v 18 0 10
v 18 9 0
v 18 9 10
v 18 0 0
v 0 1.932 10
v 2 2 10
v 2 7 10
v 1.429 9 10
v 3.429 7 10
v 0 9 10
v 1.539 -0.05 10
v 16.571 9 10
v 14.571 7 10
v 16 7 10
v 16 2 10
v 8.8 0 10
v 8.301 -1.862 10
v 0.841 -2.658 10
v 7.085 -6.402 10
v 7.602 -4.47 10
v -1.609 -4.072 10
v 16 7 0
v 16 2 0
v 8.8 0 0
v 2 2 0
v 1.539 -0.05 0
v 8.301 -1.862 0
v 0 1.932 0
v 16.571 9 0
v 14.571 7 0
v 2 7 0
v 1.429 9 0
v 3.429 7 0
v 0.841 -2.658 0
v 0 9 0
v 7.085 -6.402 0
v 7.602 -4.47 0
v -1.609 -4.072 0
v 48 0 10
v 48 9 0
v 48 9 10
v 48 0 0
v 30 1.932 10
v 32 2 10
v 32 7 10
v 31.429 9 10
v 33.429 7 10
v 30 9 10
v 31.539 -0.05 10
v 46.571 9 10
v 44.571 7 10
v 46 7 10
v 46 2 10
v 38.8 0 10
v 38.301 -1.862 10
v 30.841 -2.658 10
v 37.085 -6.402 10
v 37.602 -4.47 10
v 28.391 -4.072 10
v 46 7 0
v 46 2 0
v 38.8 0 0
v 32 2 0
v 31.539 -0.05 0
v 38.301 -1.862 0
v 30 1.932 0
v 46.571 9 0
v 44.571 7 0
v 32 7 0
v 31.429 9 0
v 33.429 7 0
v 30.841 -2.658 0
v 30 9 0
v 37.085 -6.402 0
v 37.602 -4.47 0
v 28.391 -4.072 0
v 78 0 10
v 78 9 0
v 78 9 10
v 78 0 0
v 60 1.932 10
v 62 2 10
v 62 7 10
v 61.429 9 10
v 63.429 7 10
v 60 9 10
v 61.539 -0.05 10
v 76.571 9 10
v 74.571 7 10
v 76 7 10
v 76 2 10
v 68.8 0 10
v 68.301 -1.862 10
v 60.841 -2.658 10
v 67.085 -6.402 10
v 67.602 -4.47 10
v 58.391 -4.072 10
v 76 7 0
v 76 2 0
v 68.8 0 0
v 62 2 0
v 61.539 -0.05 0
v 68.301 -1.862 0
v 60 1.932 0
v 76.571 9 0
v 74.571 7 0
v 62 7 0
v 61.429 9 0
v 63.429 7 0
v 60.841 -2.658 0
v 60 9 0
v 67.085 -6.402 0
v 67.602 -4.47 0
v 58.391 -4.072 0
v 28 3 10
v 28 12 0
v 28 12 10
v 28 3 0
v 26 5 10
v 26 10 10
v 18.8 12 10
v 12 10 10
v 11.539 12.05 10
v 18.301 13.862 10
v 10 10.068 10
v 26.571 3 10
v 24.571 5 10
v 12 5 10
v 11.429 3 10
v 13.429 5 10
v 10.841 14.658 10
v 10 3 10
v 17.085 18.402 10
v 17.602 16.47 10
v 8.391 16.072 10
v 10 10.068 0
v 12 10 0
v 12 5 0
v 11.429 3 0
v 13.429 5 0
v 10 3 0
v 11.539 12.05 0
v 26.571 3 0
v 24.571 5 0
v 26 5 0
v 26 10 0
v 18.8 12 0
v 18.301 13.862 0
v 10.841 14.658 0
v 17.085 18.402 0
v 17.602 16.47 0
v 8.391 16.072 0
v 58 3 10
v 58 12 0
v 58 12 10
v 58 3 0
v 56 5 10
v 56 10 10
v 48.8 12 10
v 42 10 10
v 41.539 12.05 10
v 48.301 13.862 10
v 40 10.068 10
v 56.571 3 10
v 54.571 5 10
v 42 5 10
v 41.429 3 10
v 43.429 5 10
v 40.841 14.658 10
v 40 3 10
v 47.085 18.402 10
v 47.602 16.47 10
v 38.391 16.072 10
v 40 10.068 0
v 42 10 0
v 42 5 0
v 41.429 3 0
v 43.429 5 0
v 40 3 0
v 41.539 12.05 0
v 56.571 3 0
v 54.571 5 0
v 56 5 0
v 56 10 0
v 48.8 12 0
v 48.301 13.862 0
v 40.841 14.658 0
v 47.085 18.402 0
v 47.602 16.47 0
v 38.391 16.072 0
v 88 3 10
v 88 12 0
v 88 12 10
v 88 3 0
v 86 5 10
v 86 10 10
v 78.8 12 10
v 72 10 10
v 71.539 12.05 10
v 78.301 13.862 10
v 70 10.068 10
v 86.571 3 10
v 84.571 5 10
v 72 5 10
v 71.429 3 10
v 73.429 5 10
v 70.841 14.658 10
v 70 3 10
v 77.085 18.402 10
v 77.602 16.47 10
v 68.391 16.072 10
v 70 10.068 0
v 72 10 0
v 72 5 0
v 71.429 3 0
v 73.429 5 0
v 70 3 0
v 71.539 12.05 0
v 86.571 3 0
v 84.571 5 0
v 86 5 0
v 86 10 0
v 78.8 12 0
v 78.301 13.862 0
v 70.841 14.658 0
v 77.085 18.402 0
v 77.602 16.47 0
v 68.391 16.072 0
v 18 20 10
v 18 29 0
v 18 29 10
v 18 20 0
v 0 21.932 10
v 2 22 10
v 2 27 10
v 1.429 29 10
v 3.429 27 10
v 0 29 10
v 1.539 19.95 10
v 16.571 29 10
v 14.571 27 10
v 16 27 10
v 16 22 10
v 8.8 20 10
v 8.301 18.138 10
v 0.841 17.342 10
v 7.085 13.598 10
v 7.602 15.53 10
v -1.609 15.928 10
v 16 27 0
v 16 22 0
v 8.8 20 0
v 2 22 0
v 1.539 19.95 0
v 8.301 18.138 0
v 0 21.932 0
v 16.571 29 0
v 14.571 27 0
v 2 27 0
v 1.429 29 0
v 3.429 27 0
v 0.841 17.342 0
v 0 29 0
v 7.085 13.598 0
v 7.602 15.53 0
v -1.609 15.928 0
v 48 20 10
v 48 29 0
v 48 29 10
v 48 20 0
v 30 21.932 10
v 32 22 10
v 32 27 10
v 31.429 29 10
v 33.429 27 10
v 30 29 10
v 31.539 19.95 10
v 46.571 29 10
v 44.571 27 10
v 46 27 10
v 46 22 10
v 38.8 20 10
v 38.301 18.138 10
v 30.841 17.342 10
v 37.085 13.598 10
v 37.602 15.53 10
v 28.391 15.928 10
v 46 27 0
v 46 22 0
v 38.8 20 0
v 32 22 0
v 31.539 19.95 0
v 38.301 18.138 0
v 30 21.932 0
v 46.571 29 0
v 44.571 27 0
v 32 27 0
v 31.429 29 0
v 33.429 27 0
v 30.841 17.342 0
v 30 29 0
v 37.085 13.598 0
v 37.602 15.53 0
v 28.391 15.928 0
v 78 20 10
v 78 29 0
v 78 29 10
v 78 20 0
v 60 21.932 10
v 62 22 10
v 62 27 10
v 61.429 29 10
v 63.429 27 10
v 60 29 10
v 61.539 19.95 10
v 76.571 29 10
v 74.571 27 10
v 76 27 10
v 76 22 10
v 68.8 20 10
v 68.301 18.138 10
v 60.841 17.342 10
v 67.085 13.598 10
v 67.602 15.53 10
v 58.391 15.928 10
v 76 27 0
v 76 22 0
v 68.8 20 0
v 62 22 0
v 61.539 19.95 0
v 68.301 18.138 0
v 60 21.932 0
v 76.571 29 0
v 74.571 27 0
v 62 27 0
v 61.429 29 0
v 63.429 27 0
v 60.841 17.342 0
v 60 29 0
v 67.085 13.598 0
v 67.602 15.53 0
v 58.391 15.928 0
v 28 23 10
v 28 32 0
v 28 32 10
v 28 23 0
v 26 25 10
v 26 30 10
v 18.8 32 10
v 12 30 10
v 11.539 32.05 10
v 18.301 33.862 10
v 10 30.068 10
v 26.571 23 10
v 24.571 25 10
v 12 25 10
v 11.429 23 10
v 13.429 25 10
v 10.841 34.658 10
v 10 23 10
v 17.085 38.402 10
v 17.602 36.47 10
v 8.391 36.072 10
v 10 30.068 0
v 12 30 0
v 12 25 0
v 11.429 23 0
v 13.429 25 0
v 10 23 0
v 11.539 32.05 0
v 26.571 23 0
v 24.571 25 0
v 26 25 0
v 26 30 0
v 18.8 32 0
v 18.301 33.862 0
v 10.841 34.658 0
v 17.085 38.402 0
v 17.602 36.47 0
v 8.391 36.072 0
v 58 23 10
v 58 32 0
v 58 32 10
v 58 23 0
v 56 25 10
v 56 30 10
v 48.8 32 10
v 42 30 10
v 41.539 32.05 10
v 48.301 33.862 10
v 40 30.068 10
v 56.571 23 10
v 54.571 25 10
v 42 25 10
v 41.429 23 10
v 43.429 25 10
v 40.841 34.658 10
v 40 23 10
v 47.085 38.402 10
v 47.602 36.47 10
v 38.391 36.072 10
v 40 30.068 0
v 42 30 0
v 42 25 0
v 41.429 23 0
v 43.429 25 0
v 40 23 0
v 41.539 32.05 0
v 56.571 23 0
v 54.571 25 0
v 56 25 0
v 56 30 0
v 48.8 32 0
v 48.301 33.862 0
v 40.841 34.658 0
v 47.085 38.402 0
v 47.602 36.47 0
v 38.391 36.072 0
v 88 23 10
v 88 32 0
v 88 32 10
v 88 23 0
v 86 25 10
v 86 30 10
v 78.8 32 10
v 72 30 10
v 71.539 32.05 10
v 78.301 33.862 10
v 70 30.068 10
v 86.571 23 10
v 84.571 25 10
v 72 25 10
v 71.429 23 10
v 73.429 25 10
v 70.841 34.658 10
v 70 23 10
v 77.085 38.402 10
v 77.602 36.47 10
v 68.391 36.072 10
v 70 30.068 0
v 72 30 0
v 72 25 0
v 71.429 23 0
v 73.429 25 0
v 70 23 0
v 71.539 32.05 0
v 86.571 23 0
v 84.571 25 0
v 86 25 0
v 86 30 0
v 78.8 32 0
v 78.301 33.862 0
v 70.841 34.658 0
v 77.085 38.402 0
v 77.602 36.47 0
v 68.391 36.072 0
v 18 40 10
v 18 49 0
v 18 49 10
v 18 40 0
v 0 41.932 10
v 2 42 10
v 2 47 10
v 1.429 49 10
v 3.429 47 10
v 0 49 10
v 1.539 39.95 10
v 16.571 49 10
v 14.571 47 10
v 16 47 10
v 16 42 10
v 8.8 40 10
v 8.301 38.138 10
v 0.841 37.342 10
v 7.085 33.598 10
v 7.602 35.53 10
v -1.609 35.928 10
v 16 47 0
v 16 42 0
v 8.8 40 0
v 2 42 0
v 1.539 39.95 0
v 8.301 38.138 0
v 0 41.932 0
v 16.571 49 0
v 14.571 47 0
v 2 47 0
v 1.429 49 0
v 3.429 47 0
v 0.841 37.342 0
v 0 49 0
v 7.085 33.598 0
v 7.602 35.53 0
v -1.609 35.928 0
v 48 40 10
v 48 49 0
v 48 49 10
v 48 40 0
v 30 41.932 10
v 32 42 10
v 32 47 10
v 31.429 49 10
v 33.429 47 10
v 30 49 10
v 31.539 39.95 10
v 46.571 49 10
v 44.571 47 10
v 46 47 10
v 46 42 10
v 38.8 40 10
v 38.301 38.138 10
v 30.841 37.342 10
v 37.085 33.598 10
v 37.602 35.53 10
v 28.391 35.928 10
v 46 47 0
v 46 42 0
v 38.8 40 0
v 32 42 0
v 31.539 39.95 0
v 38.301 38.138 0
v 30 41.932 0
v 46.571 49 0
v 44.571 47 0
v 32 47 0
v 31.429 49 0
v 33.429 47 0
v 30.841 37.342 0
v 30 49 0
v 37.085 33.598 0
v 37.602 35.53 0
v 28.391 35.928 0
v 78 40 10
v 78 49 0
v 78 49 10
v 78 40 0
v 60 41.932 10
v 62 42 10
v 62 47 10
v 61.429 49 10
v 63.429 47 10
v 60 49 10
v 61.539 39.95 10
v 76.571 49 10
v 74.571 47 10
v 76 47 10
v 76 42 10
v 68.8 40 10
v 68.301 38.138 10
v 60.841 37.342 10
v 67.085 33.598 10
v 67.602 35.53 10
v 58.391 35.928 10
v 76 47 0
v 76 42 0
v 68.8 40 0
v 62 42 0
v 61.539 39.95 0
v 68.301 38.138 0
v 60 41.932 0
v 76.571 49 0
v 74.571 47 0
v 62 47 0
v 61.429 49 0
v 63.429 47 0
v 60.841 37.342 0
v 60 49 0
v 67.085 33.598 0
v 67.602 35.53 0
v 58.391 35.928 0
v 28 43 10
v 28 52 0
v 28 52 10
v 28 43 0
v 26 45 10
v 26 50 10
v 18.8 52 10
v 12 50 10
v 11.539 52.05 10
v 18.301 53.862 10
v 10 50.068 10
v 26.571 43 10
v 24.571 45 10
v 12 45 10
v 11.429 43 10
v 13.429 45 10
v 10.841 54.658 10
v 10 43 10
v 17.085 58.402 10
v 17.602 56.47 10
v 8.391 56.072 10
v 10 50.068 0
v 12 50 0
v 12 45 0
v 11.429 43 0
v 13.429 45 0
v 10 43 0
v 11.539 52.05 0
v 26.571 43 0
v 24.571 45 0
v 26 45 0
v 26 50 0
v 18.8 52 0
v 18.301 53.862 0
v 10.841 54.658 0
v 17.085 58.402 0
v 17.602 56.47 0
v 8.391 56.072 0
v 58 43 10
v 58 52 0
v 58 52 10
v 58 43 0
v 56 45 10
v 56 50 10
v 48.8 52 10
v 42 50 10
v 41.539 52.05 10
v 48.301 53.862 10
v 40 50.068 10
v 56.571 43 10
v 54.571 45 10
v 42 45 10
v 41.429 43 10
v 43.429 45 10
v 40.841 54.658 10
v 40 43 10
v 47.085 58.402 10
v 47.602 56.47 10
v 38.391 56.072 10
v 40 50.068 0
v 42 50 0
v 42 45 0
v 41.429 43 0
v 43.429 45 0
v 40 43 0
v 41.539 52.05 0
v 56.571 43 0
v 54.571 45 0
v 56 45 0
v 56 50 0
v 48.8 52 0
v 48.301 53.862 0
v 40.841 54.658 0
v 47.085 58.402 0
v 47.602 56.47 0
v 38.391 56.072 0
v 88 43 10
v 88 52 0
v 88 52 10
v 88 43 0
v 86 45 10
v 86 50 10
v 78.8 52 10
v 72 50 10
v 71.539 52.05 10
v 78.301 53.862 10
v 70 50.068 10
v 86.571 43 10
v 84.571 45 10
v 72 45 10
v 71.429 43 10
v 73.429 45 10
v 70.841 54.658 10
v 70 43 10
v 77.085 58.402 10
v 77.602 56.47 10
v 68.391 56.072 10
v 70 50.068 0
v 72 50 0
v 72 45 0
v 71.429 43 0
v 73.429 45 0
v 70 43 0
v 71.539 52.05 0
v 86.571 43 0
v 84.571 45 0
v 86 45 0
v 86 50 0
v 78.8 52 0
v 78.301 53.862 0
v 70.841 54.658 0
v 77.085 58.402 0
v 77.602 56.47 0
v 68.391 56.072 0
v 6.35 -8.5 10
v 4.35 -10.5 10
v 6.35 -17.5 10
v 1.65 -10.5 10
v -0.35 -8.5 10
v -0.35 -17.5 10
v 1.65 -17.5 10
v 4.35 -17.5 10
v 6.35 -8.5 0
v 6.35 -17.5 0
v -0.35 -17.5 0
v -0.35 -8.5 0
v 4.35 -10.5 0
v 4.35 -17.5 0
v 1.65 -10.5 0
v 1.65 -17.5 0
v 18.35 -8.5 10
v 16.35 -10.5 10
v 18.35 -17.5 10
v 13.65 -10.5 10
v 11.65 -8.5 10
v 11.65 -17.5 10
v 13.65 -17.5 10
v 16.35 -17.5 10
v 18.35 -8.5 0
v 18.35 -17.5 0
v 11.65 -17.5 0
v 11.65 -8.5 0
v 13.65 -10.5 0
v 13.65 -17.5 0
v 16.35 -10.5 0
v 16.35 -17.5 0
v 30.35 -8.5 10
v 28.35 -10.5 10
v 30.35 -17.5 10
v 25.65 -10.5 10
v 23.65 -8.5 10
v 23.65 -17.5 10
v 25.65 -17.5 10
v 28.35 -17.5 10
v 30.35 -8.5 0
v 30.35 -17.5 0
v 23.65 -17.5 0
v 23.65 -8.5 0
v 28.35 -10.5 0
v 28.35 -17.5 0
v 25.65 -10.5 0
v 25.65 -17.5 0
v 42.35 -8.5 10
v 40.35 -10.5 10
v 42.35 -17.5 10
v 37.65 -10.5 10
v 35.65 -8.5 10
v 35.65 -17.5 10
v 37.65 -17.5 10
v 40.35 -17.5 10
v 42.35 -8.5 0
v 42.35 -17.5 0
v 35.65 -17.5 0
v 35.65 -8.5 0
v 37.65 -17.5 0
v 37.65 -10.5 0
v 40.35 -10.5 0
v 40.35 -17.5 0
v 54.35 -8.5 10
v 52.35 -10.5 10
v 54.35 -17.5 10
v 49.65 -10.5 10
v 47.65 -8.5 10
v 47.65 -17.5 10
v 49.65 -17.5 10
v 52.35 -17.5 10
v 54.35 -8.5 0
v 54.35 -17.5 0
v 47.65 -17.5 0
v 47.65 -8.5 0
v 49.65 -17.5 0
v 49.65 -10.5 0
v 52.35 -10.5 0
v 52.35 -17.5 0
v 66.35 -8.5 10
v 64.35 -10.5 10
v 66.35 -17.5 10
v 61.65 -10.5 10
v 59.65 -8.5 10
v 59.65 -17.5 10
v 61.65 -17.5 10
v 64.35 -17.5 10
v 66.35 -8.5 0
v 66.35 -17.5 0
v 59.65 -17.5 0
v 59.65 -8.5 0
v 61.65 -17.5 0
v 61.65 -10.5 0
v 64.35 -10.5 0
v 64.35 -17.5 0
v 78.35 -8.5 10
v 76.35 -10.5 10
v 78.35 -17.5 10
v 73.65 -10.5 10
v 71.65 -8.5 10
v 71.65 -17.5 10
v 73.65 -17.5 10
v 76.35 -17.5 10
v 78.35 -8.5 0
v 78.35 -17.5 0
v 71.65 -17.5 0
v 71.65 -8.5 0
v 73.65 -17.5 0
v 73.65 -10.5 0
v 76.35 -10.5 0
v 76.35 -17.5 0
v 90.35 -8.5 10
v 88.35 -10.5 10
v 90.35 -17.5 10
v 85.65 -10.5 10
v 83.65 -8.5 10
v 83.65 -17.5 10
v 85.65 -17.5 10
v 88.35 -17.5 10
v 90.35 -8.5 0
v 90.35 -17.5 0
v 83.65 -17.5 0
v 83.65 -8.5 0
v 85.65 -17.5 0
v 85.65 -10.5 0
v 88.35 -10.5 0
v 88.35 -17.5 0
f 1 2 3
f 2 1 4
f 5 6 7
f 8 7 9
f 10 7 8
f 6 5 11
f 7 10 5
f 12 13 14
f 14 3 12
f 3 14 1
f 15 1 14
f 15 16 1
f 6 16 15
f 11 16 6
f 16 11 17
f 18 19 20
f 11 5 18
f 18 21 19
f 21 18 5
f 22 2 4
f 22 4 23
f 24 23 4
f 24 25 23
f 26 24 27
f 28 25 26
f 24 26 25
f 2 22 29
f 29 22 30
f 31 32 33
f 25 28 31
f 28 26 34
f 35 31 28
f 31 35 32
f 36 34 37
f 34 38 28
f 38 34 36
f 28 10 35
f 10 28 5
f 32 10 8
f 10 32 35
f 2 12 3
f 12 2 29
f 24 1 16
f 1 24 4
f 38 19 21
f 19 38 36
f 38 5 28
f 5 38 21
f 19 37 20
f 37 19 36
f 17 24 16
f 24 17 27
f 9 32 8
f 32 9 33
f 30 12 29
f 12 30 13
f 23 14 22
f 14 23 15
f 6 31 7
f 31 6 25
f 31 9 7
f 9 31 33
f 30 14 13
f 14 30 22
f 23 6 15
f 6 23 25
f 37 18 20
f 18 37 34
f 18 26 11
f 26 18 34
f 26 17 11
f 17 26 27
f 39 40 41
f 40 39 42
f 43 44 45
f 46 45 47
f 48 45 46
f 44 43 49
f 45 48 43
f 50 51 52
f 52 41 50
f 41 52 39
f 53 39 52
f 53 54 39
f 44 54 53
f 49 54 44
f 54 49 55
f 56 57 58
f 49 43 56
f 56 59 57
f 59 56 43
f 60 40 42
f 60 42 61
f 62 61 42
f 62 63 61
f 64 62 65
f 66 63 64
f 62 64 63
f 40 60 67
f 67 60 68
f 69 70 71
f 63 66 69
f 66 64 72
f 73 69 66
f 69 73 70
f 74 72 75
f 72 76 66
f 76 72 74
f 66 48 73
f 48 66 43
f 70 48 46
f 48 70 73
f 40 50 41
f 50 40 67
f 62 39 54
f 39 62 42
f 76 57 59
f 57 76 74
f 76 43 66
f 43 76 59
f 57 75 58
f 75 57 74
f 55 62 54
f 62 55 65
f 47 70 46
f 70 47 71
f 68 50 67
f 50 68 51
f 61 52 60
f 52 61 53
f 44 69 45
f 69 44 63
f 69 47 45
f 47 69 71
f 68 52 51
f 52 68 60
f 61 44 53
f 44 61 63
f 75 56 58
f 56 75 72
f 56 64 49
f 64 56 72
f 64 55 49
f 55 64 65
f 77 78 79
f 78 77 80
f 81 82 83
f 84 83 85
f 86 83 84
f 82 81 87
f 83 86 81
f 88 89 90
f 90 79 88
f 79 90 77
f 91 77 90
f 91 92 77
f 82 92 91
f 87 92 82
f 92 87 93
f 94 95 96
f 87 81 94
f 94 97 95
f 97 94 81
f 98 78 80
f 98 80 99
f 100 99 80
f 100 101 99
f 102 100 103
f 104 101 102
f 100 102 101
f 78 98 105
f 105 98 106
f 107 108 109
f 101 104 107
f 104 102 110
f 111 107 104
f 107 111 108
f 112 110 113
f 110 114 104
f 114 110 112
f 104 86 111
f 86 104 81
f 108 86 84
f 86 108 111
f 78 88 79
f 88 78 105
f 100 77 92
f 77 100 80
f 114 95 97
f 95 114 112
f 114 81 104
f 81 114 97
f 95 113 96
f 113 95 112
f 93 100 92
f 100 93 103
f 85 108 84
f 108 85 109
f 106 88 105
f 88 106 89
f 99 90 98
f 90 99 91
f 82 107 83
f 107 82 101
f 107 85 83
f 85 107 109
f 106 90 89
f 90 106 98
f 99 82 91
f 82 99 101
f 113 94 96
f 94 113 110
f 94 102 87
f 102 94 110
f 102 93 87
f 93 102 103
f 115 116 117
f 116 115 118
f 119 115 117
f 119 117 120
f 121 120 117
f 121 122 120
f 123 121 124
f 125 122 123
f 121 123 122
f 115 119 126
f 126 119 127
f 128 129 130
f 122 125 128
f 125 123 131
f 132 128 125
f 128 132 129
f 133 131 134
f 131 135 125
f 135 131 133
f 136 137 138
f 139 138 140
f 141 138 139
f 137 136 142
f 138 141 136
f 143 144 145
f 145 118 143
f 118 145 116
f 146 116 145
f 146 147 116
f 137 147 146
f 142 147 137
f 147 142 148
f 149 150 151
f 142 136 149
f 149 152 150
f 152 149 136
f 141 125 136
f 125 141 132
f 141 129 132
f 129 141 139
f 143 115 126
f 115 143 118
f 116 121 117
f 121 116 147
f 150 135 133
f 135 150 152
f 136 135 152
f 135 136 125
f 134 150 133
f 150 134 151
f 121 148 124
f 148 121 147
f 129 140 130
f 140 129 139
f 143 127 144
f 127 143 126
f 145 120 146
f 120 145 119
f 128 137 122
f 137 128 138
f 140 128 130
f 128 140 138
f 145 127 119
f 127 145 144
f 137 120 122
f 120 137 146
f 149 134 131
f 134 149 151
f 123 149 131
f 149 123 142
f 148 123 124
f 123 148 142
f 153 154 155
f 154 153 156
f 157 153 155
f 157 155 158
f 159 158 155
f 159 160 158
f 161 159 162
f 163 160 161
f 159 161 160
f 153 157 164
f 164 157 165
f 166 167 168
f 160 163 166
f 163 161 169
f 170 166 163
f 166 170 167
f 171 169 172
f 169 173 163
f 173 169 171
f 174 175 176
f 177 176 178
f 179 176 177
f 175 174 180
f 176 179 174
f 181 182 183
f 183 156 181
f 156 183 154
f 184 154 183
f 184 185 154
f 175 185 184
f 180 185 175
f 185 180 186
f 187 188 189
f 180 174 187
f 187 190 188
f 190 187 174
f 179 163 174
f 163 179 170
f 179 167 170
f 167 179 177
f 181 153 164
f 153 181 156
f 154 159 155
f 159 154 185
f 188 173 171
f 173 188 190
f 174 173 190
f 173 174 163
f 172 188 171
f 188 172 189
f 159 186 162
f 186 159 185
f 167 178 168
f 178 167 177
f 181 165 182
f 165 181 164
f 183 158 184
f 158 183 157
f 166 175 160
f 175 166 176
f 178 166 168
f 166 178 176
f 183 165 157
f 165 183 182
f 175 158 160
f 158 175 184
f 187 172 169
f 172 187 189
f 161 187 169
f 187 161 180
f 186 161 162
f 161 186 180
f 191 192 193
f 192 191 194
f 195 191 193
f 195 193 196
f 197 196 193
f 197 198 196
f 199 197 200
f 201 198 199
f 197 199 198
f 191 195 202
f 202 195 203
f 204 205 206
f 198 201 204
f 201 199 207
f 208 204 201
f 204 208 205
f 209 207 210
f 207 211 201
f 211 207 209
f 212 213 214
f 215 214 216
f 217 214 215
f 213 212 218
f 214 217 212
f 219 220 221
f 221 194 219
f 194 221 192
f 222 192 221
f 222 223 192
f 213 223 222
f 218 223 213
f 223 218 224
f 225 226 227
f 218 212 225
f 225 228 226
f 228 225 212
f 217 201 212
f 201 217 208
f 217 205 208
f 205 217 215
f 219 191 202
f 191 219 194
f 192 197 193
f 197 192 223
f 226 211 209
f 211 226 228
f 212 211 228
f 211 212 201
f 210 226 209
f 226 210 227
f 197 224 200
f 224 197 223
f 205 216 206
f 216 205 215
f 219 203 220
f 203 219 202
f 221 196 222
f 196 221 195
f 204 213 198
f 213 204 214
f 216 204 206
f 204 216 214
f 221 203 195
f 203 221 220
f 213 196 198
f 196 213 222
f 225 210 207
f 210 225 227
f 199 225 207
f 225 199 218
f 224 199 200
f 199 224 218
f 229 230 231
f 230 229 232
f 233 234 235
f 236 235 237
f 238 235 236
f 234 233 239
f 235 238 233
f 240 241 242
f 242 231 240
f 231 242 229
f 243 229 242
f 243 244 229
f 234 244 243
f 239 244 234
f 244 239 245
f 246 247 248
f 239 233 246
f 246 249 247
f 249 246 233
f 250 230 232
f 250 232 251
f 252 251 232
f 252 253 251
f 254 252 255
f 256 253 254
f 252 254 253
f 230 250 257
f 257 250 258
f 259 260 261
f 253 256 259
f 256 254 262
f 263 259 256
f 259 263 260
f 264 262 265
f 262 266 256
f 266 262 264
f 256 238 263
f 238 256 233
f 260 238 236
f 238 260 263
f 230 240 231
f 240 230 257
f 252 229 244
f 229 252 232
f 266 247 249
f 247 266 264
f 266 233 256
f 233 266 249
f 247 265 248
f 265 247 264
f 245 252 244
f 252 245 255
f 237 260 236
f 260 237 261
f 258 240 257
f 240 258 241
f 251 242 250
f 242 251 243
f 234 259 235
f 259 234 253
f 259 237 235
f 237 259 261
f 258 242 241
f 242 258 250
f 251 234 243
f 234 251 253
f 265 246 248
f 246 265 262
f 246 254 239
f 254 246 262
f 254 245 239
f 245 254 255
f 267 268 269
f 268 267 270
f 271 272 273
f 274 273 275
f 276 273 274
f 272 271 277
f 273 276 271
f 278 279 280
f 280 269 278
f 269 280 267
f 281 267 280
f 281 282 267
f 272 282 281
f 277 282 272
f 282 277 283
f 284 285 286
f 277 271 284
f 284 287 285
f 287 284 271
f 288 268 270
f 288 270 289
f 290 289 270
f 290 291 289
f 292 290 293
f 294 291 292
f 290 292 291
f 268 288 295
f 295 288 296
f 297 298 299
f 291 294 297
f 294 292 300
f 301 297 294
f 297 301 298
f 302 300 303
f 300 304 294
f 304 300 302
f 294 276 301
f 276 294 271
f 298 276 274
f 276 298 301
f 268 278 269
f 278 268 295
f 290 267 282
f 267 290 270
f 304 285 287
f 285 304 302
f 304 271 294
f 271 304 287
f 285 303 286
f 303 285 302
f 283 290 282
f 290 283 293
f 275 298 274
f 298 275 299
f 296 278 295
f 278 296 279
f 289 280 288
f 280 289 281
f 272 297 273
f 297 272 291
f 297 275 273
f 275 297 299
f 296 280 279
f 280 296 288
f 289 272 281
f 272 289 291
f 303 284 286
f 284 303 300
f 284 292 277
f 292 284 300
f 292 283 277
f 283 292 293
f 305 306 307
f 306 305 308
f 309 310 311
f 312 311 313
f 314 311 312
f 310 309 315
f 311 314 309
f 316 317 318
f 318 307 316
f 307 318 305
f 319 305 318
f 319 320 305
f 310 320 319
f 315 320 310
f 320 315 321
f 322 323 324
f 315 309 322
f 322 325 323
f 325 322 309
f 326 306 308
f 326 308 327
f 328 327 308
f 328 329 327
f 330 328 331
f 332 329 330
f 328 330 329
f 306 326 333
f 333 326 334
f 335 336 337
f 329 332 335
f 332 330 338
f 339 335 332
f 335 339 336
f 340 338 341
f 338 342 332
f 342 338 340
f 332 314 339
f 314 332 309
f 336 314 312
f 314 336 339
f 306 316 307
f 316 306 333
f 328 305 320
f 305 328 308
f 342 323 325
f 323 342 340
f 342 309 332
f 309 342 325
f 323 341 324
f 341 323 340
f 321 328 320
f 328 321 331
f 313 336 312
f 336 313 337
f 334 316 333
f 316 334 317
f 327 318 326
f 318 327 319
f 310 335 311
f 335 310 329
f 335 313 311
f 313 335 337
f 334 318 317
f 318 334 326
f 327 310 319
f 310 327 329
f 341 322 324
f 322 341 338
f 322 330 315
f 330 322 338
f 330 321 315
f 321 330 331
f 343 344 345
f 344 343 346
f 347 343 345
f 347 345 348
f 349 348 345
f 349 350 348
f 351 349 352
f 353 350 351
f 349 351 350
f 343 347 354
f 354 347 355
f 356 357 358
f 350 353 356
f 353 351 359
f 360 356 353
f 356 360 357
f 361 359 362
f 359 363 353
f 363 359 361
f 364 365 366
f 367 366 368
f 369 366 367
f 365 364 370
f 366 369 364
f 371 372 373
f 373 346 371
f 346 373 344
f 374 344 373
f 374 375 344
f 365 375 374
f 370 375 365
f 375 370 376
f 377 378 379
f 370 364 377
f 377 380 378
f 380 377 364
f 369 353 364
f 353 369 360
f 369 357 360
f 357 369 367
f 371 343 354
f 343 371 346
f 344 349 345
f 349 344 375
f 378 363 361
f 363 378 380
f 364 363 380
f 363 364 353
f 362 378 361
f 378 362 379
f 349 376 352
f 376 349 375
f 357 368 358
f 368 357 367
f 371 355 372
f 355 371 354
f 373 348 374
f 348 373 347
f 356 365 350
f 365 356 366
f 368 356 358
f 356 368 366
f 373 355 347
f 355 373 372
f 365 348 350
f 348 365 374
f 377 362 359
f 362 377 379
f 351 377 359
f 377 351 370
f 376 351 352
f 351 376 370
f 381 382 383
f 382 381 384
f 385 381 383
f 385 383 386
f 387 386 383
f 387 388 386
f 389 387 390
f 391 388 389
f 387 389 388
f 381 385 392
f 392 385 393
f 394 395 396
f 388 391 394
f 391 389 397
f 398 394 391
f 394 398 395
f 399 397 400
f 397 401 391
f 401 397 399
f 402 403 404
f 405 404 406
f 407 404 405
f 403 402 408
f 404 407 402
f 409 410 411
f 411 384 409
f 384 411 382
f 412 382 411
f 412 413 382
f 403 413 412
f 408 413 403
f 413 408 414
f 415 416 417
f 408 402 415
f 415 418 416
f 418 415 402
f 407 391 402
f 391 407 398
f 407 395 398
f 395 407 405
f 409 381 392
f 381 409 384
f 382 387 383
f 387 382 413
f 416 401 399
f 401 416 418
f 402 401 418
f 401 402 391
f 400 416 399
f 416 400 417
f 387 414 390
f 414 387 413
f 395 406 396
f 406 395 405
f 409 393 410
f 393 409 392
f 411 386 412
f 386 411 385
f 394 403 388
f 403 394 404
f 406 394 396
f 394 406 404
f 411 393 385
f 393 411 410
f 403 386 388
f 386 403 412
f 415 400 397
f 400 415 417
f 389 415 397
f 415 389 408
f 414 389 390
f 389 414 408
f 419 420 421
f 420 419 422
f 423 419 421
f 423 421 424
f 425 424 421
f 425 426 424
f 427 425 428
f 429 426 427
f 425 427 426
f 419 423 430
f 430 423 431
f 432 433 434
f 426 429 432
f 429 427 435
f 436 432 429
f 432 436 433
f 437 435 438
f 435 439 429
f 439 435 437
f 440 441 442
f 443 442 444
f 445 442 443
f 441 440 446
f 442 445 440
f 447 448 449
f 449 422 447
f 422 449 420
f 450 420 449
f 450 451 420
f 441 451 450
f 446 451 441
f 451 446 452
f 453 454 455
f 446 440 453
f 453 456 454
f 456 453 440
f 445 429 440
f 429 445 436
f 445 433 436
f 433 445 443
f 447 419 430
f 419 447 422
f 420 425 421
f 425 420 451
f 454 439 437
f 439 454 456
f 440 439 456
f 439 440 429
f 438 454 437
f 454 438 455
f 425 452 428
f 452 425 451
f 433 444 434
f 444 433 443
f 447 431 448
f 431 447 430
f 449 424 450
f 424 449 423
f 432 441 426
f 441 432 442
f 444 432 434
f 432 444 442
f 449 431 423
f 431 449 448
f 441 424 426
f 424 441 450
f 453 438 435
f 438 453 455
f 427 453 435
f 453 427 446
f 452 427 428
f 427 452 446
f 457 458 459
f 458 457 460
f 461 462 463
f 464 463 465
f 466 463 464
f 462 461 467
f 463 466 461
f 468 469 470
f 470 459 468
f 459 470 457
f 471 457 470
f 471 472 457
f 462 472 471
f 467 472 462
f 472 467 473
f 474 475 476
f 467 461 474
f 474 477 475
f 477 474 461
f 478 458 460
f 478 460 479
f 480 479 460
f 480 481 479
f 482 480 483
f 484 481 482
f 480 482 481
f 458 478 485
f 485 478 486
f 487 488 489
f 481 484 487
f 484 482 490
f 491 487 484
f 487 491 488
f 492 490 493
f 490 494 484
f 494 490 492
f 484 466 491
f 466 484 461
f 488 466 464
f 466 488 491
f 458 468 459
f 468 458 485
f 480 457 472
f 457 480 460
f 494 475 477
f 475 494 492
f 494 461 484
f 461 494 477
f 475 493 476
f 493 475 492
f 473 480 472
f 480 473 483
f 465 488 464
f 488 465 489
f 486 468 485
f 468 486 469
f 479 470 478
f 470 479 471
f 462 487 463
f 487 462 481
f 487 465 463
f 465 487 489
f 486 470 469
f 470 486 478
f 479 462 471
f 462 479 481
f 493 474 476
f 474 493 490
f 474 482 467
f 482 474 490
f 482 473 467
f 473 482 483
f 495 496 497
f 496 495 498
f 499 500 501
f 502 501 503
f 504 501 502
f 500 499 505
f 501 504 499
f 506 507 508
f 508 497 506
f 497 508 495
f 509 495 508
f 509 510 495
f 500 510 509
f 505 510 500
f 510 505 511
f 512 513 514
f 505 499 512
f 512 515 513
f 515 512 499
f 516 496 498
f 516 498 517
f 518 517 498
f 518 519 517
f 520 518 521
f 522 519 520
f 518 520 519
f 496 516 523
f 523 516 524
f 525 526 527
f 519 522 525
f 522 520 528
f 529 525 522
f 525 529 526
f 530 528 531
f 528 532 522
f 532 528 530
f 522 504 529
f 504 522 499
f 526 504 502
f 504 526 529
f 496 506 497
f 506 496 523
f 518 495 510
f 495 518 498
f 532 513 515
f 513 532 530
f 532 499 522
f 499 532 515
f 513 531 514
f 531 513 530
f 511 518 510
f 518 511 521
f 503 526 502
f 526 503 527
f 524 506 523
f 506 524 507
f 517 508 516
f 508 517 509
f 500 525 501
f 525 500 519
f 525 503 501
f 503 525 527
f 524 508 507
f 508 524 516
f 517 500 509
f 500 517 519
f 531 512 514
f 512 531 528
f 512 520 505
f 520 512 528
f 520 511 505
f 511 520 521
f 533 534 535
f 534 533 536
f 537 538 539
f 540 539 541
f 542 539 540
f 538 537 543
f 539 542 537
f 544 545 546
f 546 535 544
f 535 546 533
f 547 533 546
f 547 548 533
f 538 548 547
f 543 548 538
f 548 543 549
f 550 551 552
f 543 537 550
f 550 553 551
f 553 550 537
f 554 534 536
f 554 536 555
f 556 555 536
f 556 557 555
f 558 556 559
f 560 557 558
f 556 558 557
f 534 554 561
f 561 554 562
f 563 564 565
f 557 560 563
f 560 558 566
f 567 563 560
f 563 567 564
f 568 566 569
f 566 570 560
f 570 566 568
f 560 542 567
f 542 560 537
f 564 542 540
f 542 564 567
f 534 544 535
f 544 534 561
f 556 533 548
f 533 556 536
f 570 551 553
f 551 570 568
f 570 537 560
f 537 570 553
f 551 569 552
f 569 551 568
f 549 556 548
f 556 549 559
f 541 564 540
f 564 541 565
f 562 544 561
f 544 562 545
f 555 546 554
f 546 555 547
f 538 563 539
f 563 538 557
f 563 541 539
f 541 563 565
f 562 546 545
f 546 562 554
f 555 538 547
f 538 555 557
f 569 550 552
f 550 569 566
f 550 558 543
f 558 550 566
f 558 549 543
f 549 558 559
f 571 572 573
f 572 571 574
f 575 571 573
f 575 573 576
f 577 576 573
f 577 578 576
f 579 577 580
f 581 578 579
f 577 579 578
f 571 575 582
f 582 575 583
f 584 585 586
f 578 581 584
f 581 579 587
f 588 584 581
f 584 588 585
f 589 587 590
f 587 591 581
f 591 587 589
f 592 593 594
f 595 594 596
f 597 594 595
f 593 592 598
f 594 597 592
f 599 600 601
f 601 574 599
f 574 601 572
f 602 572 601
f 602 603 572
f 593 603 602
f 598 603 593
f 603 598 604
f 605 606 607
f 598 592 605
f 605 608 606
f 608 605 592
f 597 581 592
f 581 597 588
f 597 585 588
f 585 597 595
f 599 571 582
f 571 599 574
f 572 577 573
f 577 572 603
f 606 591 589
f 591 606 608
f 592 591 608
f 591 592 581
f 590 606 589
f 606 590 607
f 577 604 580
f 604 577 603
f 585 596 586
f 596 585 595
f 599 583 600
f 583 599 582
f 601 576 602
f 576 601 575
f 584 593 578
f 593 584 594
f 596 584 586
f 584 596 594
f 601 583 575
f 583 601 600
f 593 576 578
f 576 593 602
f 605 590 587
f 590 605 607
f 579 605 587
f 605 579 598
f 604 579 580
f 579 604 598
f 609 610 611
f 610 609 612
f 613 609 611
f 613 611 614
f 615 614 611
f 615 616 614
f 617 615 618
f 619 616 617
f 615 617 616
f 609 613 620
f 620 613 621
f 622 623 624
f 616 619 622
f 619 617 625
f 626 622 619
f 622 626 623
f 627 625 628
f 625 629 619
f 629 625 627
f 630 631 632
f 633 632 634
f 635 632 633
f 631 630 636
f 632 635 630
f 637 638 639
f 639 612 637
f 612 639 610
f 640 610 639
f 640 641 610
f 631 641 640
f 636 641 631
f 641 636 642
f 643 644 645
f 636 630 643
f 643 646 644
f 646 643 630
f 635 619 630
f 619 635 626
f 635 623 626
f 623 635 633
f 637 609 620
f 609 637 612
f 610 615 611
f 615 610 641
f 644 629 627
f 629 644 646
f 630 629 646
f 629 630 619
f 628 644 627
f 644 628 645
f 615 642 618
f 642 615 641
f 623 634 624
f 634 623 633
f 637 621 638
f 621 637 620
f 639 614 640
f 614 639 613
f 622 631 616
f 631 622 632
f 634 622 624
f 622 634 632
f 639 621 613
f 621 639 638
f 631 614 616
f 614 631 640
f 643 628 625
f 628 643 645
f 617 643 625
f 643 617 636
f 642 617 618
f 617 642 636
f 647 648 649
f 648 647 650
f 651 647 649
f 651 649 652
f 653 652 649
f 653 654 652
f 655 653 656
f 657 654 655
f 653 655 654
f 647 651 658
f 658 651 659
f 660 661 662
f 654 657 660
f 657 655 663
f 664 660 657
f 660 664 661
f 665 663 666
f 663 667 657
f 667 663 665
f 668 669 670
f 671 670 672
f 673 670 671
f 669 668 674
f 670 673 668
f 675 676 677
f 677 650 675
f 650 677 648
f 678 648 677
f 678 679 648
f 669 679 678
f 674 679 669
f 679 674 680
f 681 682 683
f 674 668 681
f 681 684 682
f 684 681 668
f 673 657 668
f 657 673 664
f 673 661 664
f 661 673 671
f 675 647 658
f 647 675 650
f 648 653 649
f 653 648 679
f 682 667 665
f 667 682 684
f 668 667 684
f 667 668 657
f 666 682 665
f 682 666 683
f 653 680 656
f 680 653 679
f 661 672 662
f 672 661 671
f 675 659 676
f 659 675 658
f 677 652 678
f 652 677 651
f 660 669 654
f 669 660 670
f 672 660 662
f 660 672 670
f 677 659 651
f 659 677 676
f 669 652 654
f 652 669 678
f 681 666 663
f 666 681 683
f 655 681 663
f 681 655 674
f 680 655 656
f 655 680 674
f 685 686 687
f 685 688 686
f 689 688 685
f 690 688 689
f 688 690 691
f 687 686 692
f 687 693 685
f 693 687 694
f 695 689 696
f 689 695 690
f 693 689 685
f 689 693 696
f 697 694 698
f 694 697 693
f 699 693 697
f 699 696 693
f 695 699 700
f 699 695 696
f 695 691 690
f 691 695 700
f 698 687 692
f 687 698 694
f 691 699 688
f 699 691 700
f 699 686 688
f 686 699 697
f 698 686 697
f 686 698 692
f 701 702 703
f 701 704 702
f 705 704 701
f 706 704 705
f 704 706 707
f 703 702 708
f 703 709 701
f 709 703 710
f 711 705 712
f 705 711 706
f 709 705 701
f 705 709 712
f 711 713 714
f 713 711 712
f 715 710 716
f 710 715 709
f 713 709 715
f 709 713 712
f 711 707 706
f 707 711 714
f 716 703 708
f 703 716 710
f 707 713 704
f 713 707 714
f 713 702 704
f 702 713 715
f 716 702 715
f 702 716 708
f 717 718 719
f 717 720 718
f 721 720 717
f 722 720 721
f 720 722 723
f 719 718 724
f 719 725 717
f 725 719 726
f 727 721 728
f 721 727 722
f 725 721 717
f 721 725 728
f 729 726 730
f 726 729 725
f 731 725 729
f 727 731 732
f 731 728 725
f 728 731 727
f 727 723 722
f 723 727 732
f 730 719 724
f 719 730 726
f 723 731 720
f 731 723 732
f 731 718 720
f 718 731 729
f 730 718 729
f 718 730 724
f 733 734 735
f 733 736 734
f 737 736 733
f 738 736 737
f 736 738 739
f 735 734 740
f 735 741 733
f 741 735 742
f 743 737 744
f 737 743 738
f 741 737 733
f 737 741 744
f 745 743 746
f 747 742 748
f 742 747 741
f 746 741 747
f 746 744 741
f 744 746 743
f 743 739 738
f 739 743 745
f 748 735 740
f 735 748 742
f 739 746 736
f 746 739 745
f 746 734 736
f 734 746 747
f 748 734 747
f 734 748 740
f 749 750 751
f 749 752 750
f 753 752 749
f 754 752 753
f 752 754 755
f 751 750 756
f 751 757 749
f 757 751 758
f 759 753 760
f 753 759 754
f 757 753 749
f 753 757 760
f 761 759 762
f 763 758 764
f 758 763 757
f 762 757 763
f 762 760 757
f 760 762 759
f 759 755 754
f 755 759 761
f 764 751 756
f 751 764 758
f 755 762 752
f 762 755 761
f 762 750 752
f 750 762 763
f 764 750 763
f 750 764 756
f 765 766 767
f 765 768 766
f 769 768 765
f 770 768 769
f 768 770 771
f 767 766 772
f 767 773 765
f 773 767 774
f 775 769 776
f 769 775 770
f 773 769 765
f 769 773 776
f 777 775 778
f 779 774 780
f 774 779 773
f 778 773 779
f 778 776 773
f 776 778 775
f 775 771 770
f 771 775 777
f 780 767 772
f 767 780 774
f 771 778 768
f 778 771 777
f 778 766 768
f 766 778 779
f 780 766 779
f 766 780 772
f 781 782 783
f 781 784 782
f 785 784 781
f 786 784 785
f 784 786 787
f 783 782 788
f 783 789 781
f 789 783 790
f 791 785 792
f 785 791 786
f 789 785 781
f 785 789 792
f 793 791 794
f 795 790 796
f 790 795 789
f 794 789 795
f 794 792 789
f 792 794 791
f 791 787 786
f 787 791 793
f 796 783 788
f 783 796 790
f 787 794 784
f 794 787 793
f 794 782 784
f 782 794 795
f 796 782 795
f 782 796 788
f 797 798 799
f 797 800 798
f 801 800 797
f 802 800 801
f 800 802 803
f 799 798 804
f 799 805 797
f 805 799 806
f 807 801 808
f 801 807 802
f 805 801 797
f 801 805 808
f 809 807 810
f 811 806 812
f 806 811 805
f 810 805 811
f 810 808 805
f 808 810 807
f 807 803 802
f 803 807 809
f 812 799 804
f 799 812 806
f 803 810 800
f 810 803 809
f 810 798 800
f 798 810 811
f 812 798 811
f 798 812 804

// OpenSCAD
T = 2;
led_width = 14;
led_thick = 5;
tank_lip_thick = 2.7;
clip_width = 10;
clip_depth = 5;
angle = 75;


module clip(skip_holder=false) {
    difference() {
        union() {
            if(!skip_holder) {
                cube([led_width+T*2, led_thick+2*T, clip_width]);
            }
            
            rotate([0,0,angle])
            translate([-1,-4,clip_width/2])
            cube([tank_lip_thick+2*T, clip_depth+2*T, clip_width], center=true);
            
            
        }
        translate([T,T,-1])
        cube([led_width, led_thick, 100]);
        for (i=[-1,1])
        translate([(led_width+T*2)/2+i*1.5,led_thick+2*T+1,-1])
        rotate([0,0,45])
        cube([10, 10, 100], center=true);


        rotate([0,0,angle])
        translate([-1,-T-4,clip_width/2])
        cube([tank_lip_thick, clip_depth+2*T, 100], center=true);

    }
}

for (i=[0:2]) {
    for (j=[0,1]) {
        for (k=[0:2]) {
            translate([j*10 + k*30,j*12 + i*20,0])
            rotate([0,0,j*180])
            mirror([j,0,0])
            clip();
        }
    }
}

for (k=[0:7]) {
    translate([k*12+4,-9,0])
    rotate([0,0,-angle])
    clip(skip_holder=true);
}
